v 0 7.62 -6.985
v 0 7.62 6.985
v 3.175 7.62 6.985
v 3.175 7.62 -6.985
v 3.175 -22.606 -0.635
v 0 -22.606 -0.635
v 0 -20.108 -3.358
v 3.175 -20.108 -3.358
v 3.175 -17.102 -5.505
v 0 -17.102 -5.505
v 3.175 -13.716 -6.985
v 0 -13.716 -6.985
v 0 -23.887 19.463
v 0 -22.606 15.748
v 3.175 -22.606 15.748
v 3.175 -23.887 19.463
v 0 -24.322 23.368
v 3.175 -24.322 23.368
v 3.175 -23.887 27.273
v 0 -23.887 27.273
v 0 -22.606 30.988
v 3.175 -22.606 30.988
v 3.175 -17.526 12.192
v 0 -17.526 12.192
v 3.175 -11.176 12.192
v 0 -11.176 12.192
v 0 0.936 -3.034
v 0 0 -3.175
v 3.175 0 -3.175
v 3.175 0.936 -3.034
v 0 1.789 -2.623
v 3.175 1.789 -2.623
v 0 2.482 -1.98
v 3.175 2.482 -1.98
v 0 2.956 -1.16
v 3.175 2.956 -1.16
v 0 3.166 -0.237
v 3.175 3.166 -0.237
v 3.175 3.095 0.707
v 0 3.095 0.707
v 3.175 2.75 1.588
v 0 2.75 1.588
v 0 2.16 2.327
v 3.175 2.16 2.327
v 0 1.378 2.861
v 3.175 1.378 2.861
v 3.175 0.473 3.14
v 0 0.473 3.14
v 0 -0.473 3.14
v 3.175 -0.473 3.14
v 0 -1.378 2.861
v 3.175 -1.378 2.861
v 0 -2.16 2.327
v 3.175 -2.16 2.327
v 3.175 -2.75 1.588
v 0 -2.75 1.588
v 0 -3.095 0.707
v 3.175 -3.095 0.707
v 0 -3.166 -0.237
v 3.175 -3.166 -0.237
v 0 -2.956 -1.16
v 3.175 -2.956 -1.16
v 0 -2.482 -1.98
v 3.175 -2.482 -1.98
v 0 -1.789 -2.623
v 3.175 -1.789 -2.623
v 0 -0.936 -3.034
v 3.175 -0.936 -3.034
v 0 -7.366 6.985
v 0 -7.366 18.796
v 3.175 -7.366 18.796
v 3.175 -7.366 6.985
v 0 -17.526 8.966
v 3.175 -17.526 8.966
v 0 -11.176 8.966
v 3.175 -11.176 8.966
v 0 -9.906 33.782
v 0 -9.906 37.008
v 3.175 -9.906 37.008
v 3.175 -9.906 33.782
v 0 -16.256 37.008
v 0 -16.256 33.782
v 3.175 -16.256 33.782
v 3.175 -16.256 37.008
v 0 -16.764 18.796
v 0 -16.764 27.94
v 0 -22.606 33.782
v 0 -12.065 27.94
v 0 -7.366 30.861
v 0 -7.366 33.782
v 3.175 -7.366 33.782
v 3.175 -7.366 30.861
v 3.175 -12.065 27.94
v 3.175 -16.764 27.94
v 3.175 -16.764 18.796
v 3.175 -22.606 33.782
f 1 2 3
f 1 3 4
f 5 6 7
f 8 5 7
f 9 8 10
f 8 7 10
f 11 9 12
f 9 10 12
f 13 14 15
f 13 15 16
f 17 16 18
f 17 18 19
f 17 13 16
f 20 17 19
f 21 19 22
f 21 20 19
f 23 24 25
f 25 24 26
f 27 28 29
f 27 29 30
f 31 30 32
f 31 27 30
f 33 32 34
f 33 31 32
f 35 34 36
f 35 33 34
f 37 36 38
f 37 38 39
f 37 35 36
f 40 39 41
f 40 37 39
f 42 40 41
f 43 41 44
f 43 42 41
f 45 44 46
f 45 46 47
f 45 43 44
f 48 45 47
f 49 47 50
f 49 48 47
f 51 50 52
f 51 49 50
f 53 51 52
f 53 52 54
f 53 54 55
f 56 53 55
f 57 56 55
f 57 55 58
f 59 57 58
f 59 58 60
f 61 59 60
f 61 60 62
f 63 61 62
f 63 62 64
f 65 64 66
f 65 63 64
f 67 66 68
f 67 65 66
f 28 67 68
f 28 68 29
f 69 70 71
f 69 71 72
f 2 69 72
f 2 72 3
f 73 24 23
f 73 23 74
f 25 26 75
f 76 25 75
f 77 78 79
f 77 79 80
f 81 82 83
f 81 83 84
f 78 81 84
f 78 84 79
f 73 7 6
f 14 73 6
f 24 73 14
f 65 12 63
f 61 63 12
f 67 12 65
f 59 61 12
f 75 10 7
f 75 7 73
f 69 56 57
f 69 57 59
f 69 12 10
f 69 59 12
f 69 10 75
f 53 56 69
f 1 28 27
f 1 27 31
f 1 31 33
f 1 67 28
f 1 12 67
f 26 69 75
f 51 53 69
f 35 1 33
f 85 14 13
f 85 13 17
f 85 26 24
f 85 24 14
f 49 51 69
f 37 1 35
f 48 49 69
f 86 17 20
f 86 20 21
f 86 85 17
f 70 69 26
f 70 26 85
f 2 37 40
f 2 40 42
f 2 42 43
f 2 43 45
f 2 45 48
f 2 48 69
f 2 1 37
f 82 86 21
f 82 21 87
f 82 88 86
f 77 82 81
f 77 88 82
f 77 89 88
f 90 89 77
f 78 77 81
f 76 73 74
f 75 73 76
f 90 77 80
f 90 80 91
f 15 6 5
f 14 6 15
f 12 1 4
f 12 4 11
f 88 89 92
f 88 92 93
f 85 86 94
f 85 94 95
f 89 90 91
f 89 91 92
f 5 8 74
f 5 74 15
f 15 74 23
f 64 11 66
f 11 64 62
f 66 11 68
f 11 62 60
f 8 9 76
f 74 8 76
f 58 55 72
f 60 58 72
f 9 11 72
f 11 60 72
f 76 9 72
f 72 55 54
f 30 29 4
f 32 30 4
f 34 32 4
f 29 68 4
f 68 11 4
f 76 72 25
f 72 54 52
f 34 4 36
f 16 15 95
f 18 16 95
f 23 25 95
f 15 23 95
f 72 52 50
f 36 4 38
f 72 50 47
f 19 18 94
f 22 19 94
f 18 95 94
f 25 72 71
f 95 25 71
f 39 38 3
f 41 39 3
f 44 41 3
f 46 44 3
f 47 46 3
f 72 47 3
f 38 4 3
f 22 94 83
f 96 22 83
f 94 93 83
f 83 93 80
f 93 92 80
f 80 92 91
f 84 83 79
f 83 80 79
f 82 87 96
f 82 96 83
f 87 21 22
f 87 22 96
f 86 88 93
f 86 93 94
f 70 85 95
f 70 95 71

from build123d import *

# Parameters (mm, degrees)
SKETCH1_R                = 3.175
SKETCH1_W                = 3.2258
SKETCH1_H                = 6.35
BOSS_EXTRUDE1_DEPTH      = 3.175
ADD_BODY_AT_BOTTOM_DEPTH = 3.175
CUT_EXTRUDE1_DEPTH       = 4.175


with BuildPart() as part:
    # Sketch1 → Boss-Extrude1 (new body)
    with BuildSketch(Plane(origin=(0, 0, 0), x_dir=(0, 0, -1), z_dir=(1, 0, 0))):
        Polygon((-6.985, 7.62), (6.985, 7.62), (6.985, -22.606), (-33.782, -22.606), (-33.782, -16.256), (-37.0078, -16.256), (-37.0078, -9.906), (-33.782, -9.906), (-33.782, -7.366), (-27.94, -7.366), (-27.94, -16.764), (-18.796, -16.764), (-18.796, -7.366), (-6.985, -7.366), align=None)
        Circle(SKETCH1_R, mode=Mode.SUBTRACT)
        with Locations((-10.5791, -14.351)):
            Rectangle(SKETCH1_W, SKETCH1_H, mode=Mode.SUBTRACT)
    extrude(amount=BOSS_EXTRUDE1_DEPTH)

    # Sketch2 → add body at bottom (add)
    with BuildSketch(Plane.ZY):
        with BuildLine():
            Line((23.368, -22.606), (15.748, -22.606))
            ThreePointArc((15.748, -22.606), (23.368, -24.321629486), (30.988, -22.606))
            Line((30.988, -22.606), (23.368, -22.606))
        make_face()
    extrude(amount=-ADD_BODY_AT_BOTTOM_DEPTH)

    # Sketch3 → Cut-Extrude1 (cut, through all)
    with BuildSketch(Plane.ZY):
        Polygon((30.861, -7.366), (27.94, -12.065), (27.94, -7.366), align=None)
        with BuildLine():
            Line((-6.985, -22.606), (-0.635, -22.606))
            ThreePointArc((-0.635, -22.606), (-4.50973023, -18.660807307), (-6.985, -13.716))
            Line((-6.985, -13.716), (-6.985, -22.606))
        make_face()
    extrude(amount=-CUT_EXTRUDE1_DEPTH, mode=Mode.SUBTRACT)


solid = part.part
